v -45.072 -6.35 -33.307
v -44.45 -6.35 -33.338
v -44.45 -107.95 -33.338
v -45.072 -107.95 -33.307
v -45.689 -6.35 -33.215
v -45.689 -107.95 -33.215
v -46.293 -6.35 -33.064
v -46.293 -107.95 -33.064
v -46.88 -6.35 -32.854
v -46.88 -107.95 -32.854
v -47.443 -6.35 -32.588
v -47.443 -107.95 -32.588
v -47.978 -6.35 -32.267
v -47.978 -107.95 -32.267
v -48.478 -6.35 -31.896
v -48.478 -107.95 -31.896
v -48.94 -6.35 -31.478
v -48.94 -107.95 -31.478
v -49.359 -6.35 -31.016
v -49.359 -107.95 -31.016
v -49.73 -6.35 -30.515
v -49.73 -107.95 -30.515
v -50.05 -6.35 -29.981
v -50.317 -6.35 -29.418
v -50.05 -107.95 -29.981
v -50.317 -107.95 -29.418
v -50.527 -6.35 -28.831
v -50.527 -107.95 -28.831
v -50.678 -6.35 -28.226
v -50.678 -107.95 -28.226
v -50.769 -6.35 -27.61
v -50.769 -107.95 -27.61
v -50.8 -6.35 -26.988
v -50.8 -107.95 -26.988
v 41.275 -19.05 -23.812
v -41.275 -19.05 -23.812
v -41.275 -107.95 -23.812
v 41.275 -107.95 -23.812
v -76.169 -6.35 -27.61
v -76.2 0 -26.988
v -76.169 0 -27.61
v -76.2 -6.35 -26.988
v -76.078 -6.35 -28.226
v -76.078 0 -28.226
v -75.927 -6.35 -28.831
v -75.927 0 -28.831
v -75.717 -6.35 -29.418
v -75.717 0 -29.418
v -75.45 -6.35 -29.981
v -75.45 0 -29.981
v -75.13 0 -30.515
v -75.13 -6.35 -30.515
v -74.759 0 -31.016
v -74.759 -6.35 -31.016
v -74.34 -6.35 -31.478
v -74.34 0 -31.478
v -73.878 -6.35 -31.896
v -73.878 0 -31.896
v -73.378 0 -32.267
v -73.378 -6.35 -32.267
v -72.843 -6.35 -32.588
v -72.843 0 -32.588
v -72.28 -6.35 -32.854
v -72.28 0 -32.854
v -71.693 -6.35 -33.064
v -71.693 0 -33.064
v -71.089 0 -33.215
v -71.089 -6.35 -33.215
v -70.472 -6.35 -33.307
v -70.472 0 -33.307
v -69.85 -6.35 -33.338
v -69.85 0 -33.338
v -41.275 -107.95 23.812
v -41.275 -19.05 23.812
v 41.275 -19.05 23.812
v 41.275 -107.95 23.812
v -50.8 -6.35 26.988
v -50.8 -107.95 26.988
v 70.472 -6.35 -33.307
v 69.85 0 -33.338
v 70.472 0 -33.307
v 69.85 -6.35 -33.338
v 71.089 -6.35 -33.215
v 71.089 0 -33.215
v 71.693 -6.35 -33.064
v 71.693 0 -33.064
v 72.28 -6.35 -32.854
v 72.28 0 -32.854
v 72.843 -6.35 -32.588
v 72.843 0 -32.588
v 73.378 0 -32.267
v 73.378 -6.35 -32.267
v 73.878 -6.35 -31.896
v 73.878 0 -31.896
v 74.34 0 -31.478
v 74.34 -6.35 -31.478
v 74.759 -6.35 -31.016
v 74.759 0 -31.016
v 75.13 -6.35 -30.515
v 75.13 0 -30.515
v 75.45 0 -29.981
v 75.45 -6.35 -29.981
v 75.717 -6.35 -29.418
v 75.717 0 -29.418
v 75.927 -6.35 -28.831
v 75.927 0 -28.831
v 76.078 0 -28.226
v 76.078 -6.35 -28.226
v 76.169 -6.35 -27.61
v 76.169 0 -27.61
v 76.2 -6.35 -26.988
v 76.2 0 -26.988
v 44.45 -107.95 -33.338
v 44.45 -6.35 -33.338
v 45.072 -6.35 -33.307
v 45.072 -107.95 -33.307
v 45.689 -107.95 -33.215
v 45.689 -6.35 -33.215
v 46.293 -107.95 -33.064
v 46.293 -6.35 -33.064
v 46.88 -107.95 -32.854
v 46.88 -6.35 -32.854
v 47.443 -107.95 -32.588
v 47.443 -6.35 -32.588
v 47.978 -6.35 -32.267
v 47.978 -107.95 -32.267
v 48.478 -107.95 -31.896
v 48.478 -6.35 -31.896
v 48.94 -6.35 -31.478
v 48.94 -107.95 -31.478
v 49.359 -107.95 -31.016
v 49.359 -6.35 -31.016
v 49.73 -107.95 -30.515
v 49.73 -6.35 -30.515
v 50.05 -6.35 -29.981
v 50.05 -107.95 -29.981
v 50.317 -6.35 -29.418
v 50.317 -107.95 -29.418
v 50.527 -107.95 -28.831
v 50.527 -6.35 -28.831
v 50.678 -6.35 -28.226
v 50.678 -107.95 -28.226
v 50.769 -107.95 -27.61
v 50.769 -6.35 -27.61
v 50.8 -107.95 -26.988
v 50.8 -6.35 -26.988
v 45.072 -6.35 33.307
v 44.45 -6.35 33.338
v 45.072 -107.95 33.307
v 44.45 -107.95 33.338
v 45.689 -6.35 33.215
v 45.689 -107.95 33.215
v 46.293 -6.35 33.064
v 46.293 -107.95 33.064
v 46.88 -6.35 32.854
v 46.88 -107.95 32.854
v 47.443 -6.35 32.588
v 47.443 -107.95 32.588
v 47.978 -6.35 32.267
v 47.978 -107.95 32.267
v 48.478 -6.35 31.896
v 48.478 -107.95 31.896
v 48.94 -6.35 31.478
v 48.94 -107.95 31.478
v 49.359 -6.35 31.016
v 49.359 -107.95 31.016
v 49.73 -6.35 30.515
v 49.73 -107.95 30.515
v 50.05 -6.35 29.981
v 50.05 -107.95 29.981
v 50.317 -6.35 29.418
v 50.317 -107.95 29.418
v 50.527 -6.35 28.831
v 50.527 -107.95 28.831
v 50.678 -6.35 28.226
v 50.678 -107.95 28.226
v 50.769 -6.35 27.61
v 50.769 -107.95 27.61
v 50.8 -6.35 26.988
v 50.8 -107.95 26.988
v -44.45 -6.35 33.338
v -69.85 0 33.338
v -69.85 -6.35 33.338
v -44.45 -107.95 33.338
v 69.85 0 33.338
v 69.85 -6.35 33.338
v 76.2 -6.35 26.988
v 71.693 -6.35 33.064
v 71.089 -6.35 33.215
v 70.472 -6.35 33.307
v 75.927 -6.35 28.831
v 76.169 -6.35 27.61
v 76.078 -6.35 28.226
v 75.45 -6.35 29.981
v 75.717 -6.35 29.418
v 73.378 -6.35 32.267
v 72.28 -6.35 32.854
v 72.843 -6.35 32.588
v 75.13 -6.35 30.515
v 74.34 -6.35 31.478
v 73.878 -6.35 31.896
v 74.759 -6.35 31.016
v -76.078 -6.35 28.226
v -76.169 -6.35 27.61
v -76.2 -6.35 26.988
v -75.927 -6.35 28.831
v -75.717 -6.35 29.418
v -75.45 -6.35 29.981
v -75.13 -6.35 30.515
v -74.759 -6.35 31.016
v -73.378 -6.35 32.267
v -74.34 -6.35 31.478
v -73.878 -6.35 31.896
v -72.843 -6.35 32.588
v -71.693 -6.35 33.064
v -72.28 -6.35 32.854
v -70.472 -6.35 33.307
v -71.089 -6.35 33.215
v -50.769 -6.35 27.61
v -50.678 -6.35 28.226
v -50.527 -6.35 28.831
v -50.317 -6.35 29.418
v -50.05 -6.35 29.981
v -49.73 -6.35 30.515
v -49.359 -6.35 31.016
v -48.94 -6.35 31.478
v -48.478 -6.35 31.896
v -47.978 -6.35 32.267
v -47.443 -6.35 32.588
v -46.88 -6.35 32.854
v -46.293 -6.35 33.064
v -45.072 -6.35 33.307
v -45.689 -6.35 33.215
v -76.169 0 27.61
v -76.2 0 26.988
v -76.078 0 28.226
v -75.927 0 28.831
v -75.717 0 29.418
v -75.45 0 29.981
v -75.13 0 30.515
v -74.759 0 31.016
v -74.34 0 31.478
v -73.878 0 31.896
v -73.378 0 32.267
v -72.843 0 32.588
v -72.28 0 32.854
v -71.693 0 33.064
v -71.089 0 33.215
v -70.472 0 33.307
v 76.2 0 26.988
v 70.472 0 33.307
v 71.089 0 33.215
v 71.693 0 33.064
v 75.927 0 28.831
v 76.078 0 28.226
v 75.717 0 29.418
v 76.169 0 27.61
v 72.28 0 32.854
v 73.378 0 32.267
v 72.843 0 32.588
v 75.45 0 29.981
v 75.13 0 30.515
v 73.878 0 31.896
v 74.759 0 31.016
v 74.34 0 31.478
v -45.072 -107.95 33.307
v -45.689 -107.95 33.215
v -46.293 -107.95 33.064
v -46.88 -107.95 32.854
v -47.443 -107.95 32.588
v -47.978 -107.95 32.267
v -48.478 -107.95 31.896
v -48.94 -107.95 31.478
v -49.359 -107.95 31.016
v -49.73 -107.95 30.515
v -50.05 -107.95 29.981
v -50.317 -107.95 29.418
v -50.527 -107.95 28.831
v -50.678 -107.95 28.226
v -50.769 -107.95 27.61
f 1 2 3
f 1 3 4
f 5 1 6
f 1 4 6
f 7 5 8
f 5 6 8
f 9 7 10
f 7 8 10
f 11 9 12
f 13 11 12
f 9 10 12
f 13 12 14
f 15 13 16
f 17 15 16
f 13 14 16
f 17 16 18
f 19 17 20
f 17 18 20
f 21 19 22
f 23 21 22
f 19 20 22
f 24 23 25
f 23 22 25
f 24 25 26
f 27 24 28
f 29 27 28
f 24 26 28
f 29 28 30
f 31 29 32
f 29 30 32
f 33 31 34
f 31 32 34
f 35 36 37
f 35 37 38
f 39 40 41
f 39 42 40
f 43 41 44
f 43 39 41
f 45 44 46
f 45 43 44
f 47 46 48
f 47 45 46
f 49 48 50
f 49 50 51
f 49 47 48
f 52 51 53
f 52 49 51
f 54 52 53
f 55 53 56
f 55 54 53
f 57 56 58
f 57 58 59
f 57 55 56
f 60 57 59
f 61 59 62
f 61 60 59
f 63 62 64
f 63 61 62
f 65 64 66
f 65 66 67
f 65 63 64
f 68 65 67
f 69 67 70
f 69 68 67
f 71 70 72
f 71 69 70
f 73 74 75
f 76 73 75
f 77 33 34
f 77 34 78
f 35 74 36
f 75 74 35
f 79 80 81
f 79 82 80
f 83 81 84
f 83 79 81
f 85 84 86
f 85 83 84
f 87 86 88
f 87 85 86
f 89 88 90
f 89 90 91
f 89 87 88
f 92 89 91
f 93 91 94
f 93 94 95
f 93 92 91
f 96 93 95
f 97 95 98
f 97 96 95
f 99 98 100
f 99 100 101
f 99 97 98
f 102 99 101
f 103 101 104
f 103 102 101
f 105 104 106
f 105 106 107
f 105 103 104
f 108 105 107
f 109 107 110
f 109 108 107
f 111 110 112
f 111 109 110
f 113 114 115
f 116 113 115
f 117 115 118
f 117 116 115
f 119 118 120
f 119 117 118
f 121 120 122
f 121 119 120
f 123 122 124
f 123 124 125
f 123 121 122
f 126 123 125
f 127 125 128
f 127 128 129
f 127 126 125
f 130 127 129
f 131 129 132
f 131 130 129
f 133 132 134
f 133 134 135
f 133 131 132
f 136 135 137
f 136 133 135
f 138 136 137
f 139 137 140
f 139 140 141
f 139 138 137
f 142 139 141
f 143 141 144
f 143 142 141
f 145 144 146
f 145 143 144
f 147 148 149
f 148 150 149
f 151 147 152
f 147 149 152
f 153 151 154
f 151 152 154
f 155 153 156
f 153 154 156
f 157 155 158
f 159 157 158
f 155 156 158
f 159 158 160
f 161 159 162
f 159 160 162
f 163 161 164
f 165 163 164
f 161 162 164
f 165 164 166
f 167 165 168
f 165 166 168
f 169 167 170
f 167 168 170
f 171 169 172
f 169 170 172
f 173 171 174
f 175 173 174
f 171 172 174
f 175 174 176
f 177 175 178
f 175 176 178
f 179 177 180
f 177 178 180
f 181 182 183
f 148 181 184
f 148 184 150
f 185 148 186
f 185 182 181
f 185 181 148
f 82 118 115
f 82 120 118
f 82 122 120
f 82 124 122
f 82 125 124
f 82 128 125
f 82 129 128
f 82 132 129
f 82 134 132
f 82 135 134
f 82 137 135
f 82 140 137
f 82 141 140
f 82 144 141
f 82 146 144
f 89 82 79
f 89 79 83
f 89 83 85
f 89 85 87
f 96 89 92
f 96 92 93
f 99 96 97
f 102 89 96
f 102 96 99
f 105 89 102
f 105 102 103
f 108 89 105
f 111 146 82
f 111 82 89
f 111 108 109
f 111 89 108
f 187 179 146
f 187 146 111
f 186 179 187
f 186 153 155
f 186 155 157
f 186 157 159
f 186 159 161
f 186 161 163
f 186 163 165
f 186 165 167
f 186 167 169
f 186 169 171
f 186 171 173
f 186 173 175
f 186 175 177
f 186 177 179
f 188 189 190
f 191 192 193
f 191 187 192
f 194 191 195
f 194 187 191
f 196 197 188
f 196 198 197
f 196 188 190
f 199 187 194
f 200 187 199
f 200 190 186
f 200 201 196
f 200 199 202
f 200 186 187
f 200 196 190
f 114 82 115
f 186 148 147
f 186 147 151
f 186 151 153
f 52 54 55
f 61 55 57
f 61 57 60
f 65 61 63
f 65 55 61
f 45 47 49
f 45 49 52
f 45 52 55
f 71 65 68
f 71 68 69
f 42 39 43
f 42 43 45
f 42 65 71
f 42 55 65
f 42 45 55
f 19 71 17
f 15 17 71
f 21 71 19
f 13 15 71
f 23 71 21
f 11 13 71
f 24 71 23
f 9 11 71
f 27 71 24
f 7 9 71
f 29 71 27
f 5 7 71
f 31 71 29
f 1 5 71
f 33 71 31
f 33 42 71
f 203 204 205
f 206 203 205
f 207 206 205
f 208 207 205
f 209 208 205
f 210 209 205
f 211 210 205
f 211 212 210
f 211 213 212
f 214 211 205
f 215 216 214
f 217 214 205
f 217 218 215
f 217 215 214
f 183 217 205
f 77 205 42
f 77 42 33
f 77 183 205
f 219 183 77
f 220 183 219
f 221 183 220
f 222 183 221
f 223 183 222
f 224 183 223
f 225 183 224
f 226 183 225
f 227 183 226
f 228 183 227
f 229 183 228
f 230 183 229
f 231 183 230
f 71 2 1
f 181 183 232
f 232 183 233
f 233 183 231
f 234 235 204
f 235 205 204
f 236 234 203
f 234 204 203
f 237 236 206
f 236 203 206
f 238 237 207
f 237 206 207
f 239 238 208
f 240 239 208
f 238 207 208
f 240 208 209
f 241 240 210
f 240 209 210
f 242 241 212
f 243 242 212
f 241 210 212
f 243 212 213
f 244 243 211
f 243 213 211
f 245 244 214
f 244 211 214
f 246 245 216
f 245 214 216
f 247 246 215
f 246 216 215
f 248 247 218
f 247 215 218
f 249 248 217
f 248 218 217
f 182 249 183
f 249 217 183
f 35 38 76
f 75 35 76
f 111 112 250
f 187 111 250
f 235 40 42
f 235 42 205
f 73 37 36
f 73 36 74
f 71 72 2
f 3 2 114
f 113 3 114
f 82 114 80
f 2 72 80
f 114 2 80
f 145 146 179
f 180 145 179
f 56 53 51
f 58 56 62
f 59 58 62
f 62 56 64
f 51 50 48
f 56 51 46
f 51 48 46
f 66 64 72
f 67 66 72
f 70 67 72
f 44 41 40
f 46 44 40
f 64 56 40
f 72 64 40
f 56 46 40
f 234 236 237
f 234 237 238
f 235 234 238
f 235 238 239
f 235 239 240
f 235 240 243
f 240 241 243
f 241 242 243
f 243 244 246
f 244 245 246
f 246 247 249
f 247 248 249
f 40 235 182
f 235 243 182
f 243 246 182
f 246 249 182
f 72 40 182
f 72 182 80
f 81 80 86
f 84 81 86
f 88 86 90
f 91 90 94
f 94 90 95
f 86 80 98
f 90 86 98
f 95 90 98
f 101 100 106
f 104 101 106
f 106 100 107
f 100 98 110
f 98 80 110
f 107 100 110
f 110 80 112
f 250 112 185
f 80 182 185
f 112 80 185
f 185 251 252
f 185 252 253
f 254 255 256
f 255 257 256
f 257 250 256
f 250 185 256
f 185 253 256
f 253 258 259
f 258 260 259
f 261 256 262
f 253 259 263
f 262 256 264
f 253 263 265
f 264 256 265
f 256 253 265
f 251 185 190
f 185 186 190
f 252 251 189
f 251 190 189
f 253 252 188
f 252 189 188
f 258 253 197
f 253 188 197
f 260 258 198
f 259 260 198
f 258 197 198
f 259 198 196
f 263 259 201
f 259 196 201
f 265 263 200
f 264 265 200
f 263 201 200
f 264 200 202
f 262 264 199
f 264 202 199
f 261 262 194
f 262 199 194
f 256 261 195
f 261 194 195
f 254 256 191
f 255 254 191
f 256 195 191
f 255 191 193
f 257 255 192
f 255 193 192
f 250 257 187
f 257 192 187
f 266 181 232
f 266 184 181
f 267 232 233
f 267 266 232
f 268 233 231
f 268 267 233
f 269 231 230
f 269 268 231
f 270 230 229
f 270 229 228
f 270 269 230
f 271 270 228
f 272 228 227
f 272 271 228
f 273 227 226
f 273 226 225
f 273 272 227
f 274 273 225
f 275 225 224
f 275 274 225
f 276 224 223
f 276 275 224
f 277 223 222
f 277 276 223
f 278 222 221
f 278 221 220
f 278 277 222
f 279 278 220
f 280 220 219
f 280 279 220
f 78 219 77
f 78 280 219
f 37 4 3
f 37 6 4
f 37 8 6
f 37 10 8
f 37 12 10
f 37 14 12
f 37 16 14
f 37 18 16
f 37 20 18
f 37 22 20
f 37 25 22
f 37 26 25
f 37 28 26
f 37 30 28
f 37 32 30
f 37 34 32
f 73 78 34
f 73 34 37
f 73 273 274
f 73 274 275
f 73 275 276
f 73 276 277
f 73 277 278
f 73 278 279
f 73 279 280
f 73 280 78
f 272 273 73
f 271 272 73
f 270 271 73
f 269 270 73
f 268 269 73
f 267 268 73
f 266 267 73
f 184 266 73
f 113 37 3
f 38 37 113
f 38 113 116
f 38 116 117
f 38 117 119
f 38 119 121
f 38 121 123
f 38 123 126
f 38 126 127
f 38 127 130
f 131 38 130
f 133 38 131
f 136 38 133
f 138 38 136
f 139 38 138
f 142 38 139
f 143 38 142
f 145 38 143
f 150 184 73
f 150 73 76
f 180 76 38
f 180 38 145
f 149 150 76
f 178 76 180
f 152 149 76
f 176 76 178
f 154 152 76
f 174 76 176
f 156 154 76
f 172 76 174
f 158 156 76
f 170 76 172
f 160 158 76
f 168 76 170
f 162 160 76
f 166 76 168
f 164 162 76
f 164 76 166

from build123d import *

# Parameters (mm, degrees)
F0_W     = 152.4
F0_H     = 66.675
F1_DEPTH = 6.35
F2_W     = 101.6
F2_H     = 66.675
F3_DEPTH = 101.6
F4_R     = 6.35
F5_W     = 82.55
F5_H     = 47.625
F6_DEPTH = 88.9


with BuildPart() as f1:
    # F0 (on Front) → F1 (new body)
    with BuildSketch(Plane.XZ):
        Rectangle(F0_W, F0_H)
    extrude(amount=F1_DEPTH)

    # F2 (on face) → F3 (join)
    with BuildSketch(Plane.XZ.offset(6.35)):
        Rectangle(F2_W, F2_H)
    extrude(amount=F3_DEPTH)

    # F4
    f4_edges = [f1.edges().sort_by_distance(p)[0] for p in [
        (76.2, -3.175, -33.3375),
        (76.2, -3.175, 33.3375),
        (-76.2, -3.175, 33.3375),
        (-76.2, -3.175, -33.3375),
        (50.8, -57.15, -33.3375),
        (50.8, -57.15, 33.3375),
        (-50.8, -57.15, 33.3375),
        (-50.8, -57.15, -33.3375),
    ]]
    fillet(f4_edges, radius=F4_R)

    # F5 (on face) → F6 (cut)
    with BuildSketch(Plane.XZ.offset(107.95)):
        Rectangle(F5_W, F5_H)
    extrude(amount=-F6_DEPTH, mode=Mode.SUBTRACT)


solid = f1.part
